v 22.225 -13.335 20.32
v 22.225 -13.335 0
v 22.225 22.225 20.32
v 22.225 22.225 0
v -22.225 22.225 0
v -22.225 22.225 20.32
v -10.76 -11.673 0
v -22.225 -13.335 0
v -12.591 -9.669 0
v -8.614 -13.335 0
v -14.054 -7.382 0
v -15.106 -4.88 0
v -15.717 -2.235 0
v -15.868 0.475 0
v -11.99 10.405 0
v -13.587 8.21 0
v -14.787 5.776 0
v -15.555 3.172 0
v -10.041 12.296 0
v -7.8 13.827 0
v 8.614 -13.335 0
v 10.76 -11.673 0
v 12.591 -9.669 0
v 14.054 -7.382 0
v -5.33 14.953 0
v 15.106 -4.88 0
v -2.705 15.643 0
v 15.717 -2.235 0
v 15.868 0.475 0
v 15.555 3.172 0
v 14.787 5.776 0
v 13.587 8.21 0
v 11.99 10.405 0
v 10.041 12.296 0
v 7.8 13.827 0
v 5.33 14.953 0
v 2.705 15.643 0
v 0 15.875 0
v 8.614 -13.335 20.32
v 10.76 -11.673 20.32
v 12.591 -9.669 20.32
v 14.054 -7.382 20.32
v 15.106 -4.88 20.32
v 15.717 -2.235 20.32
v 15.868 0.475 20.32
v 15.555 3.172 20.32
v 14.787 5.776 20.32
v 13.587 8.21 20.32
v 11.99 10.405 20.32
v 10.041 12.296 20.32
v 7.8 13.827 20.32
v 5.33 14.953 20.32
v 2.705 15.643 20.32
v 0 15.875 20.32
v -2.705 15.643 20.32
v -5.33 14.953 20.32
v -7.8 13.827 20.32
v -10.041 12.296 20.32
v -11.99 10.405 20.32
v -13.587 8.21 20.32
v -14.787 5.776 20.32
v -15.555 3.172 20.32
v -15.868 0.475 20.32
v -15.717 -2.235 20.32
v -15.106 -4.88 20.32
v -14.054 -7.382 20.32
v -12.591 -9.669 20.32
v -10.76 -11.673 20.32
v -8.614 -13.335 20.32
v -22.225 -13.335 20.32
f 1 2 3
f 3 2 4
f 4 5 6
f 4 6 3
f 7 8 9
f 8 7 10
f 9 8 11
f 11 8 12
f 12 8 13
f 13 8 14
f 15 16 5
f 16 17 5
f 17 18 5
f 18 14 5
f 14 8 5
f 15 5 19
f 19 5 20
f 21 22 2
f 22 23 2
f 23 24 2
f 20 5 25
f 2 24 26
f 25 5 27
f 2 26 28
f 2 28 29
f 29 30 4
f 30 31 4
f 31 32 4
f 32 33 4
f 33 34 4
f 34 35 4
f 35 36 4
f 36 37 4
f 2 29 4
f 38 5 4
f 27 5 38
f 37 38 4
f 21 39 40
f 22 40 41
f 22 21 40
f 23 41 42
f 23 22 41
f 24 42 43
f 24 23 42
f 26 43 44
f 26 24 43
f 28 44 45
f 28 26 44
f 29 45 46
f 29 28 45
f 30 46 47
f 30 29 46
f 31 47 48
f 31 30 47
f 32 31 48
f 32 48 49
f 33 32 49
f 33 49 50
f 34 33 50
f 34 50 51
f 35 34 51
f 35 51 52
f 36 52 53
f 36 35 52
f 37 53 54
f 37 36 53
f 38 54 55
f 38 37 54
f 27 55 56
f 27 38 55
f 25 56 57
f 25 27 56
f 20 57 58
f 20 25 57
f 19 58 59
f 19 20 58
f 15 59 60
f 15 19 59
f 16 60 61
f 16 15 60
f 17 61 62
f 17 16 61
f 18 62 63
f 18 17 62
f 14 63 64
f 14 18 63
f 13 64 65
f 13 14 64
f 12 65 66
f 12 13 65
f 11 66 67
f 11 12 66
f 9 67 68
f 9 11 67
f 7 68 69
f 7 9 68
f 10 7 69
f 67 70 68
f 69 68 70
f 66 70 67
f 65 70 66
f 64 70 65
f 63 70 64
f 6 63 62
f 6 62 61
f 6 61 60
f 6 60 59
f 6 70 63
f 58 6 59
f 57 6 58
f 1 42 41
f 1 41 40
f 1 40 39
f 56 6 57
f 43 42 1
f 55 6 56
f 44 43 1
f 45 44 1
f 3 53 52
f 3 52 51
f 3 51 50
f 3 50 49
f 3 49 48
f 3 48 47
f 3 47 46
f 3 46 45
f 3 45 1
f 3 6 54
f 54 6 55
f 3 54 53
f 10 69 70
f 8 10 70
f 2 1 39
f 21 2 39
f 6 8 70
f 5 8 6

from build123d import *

# Parameters (mm, degrees)
F0_W     = 44.45
F0_H     = 44.45
F0_R     = 15.875
F1_DEPTH = 20.32
F3_DEPTH = 20.321


with BuildPart() as f1:
    # F0 (on Top) → F1 (new body)
    with BuildSketch(Plane.XY):
        Rectangle(F0_W, F0_H)
        Circle(F0_R, mode=Mode.SUBTRACT)
    extrude(amount=F1_DEPTH)

    # F2 (on face) → F3 (cut, through all)
    with BuildSketch(Plane.XY.offset(20.32)):
        with BuildLine():
            Line((-22.225, -13.335), (-22.225, -22.225))
            Line((-22.225, -22.225), (22.225, -22.225))
            Line((22.225, -22.225), (22.225, -13.335))
            Line((22.225, -13.335), (8.613559, -13.335))
            ThreePointArc((8.613559, -13.335), (0, -15.875), (-8.613559, -13.335))
            Line((-8.613559, -13.335), (-22.225, -13.335))
        make_face()
    extrude(amount=-F3_DEPTH, mode=Mode.SUBTRACT)


solid = f1.part
